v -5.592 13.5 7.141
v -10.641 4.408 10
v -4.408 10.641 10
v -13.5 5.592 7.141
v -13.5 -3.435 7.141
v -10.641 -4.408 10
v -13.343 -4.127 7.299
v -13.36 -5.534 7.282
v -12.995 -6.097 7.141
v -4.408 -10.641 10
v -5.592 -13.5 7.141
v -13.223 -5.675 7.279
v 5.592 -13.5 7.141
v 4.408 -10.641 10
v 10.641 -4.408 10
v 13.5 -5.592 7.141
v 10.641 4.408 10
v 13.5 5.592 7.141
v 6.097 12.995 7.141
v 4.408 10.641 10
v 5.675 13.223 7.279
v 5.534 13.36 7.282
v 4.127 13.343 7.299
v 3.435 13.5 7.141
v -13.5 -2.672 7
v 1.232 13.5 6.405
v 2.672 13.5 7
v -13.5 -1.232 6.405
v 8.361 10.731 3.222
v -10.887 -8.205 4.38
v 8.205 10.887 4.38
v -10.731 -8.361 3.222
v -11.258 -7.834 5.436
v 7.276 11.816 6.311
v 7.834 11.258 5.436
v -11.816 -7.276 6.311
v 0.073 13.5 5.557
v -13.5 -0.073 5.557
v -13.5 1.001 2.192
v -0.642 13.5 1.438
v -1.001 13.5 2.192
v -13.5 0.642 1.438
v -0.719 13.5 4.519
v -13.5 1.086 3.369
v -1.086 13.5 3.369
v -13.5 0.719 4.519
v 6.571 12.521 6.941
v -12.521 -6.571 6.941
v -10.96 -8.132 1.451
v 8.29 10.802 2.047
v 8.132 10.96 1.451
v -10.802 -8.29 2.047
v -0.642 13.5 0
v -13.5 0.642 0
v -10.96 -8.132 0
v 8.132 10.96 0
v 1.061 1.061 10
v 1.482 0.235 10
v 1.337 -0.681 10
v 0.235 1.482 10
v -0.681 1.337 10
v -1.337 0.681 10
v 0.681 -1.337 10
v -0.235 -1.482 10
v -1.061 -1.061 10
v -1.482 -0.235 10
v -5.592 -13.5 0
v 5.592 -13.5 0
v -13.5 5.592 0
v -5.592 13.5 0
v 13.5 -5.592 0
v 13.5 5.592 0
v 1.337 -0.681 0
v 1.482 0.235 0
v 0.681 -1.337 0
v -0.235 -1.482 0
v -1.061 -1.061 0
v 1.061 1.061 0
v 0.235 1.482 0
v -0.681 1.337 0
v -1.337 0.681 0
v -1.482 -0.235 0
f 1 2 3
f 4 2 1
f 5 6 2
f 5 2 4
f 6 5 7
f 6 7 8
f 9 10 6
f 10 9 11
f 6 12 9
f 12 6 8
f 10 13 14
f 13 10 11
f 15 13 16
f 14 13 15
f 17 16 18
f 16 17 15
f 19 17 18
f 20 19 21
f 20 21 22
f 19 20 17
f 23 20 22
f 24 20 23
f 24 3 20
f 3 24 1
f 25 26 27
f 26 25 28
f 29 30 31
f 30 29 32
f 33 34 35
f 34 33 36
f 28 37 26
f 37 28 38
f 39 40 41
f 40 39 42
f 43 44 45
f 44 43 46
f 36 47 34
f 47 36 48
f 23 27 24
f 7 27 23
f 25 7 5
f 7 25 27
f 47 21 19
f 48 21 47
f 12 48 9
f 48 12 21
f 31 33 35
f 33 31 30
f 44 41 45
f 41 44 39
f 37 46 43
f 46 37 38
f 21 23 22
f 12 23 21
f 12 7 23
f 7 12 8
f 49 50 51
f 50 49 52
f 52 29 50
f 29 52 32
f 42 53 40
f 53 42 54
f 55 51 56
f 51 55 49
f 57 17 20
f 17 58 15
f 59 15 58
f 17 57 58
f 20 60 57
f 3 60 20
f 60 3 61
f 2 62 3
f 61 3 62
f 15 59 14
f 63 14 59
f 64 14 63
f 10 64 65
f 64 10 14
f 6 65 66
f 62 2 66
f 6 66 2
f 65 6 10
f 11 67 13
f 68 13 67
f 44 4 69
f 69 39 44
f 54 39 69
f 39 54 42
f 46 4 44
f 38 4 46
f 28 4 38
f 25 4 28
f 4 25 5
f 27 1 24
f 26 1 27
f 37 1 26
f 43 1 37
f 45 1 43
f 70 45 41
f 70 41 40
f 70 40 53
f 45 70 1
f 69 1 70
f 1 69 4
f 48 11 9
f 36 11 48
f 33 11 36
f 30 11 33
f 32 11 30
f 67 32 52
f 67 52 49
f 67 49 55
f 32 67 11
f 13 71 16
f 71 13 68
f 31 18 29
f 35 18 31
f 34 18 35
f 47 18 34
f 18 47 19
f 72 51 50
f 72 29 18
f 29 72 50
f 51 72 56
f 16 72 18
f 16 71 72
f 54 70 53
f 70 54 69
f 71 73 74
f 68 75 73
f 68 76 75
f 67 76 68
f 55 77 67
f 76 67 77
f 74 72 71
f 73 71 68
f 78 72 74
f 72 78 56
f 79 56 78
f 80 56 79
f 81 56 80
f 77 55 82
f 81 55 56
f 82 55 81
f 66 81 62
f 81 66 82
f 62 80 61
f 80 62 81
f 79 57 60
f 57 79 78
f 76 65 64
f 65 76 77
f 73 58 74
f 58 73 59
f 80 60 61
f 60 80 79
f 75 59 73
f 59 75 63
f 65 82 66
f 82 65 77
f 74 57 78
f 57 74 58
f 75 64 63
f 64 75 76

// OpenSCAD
// [FL_INDEX: keywords="openscad, 3d_parametric, any-angle_rod_clamp__for_diagonal_reprap_support, csg_solid" | COT="Parametric OpenSCAD design from 3DCodeverse"]
// Title: any-angle rod clamp, for diagonal reprap support

// Rod diameter
rod_dia=8;
// Wall thickness
wall=3;
// Screw diameter
screw_dia=3;
// Gap between clamps.
gap=2;
// Space between screw and rod.
screw_separation=1;
// Bevel
bevel=1;  //  [1, 0]
// Smooth channel
smooth=1;  //  [1, 0]


/* [Hidden] */
render_movable_parts = false;

module rod() {
  color([0.7, 0.7, 0.7]) {
    rotate([0,0,180/8])
      cylinder(r=rod_dia/2/cos(180/8), h=80, $fn=smooth ? 23 : 8, center=true);
  }
}

module clamp() {
  dia = rod_dia + screw_dia/2 + screw_separation+ wall;
  difference() {
    rotate([0,90,0])  {
      rotate([0,0,45/2]) {
	translate([0,0,gap / 2]) {
	  cylinder(r=dia/cos(180/8),
		   h=rod_dia+wall-gap / 2, $fn=8);
	}
      }
    }
    if (bevel) {
      for (rot=[0:45:360]) {
        rotate([rot,0,0]) {
  	  translate([rod_dia+wall,dia,0]) {
	    rotate([0,0,45]) {
	      cube([wall*2 * cos(180/4) - 0.2, 100, 100], center=true);
            }
	  }
        }
      }
    }
    translate([rod_dia/2,
	       (rod_dia+screw_dia+screw_separation)/2,0]) {
      rod();
      translate([-rod_dia/2, 0,0]) {
      cube([rod_dia, rod_dia, 100], center=true);
      }
    }
    rotate([0,90,0])  {
      cylinder(r=screw_dia/2, $fn=10, h = 100, center=true);
    }
  }
  if (render_movable_parts) {
    translate([rod_dia/2, (rod_dia+screw_dia+screw_separation)/2,0]) rod();
  }
}

rotate([0,90,0]) {
  translate([gap / 2,0,0]) {
    if (render_movable_parts) {
      clamp();
    }
    
    rotate([45,180,0]) clamp();
  }
}
